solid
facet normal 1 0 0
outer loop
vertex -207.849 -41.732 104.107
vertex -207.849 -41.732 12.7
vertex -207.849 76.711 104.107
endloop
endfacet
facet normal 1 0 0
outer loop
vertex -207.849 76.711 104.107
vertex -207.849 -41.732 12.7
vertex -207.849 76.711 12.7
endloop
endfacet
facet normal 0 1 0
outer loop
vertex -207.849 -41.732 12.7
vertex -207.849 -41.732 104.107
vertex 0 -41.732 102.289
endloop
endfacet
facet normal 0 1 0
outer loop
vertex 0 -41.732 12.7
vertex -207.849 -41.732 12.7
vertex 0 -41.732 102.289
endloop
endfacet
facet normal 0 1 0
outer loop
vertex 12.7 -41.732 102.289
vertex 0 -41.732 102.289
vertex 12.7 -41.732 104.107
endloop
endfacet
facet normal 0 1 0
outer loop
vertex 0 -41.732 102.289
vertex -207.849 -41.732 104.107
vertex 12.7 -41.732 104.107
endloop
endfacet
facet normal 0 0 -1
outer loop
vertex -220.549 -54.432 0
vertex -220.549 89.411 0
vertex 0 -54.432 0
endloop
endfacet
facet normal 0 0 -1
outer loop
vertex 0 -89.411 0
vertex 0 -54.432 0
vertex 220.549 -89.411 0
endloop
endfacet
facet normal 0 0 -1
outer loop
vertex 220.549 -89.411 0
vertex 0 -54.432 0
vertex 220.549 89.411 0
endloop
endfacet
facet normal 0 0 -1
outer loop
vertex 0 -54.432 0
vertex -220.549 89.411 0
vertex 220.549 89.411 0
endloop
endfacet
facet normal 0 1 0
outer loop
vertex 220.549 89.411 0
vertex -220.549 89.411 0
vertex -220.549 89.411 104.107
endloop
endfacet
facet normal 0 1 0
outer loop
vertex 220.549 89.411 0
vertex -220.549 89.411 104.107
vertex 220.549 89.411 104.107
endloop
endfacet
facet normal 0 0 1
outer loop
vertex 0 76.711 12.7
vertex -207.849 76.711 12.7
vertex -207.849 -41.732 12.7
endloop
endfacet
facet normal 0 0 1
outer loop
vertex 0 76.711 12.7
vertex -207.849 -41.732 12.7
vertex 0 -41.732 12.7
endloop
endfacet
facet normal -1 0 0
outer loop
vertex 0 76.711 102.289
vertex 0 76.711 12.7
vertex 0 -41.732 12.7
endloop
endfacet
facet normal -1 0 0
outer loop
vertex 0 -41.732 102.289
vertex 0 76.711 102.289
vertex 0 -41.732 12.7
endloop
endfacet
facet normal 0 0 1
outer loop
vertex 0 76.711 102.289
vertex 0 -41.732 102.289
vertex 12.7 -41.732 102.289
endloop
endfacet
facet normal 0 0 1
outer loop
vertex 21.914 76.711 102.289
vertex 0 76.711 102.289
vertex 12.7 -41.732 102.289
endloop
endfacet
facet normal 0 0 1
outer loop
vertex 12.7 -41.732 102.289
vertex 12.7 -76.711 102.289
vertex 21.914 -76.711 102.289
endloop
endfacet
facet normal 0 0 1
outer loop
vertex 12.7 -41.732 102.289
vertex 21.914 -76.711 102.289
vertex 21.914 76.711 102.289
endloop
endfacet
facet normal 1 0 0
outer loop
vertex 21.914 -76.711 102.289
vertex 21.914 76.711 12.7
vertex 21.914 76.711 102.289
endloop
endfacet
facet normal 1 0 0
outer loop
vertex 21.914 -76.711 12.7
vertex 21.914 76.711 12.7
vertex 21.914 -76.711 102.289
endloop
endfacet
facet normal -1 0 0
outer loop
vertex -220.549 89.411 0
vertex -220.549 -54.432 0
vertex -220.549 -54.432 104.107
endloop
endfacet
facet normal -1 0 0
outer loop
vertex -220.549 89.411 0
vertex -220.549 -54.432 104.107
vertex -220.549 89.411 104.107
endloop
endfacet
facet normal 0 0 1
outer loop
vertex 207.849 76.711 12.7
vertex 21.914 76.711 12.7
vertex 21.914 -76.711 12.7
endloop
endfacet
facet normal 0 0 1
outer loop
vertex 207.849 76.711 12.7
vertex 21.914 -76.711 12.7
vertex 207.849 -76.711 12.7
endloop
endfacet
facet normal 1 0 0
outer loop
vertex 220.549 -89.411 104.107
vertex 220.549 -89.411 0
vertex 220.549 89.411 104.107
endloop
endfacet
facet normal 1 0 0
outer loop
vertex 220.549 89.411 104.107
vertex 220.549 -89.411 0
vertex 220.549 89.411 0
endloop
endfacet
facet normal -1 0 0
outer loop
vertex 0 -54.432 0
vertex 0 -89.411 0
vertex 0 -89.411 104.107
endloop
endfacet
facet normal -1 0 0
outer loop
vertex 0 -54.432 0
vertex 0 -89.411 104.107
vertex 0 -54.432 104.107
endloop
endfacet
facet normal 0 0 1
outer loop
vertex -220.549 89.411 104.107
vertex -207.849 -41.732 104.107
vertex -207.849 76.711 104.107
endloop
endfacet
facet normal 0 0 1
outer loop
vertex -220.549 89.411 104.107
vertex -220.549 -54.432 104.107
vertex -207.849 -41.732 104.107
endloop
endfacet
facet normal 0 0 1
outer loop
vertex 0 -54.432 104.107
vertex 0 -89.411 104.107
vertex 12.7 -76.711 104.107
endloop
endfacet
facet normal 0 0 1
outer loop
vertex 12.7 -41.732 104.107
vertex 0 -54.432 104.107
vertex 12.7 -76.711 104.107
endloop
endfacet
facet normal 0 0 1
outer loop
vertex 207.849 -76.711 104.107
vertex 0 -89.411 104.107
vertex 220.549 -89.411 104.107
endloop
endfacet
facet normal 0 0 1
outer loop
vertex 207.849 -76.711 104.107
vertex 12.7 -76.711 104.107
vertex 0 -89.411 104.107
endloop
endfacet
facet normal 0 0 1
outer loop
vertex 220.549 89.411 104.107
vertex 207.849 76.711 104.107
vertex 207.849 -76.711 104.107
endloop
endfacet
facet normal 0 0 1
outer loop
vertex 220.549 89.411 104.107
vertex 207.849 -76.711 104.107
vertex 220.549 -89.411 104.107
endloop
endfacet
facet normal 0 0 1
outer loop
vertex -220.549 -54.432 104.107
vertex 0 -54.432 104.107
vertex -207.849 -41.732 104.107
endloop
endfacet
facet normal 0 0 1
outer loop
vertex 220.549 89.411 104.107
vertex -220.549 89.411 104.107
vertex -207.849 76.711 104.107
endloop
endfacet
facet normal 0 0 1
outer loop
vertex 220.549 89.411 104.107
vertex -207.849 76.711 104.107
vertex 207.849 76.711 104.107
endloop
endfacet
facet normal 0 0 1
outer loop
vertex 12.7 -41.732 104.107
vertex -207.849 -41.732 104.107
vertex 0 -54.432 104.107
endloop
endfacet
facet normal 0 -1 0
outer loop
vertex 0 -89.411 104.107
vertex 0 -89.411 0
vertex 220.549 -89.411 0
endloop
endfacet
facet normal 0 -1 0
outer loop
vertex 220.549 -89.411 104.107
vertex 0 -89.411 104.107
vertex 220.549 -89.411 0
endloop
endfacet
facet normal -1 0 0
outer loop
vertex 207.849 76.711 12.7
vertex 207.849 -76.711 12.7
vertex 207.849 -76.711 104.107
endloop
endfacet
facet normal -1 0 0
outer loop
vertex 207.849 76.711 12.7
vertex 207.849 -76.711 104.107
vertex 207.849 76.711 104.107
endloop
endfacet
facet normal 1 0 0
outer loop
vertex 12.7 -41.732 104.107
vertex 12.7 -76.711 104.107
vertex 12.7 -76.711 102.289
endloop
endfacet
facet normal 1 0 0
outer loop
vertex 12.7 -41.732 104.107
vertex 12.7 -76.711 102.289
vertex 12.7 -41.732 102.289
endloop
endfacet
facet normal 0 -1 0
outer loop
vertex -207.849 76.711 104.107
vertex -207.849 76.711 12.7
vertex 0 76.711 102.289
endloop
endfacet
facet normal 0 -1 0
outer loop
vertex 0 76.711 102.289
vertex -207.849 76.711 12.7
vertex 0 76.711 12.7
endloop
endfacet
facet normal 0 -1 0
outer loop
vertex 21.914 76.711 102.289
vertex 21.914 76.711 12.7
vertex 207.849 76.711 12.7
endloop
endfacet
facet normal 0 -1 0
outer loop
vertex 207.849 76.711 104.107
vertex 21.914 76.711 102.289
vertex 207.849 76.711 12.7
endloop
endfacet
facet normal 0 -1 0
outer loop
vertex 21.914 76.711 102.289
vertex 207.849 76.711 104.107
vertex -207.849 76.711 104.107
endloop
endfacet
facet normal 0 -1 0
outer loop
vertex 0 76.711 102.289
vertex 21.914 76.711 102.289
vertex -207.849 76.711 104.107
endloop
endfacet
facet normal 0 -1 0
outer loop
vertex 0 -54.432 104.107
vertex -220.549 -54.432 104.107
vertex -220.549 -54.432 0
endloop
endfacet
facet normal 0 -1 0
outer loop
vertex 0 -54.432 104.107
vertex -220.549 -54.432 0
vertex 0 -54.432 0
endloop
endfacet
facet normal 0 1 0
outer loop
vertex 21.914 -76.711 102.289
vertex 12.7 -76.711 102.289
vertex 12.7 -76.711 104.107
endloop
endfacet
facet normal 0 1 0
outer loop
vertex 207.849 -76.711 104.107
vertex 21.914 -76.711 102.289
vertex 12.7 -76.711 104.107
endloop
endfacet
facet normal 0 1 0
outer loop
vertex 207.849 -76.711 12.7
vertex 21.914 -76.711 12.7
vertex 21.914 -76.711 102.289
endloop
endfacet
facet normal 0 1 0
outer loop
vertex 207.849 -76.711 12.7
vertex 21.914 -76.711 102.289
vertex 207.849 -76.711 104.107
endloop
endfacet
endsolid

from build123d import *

# Parameters (mm, degrees)
F0_W     = 441.0978853703
F0_H     = 178.8222193718
F1_DEPTH = 104.1071284562
F2_W     = 220.5489426851
F2_H     = 34.9790751934
F3_DEPTH = 137.1856275946
F4_T     = -12.7
F5_W     = 21.9141840935
F5_H     = 178.8222193718
F6_DEPTH = 102.2892072797


with BuildPart() as f1:
    # F0 (on Top) → F1 (new body)
    with BuildSketch(Plane.XY):
        Rectangle(F0_W, F0_H)
    extrude(amount=F1_DEPTH)

    # F2 (on face) → F3 (cut)
    with BuildSketch(Plane.XY.offset(104.1071284562)):
        with Locations((-110.2744713426, -71.9215720892)):
            Rectangle(F2_W, F2_H)
    extrude(amount=-F3_DEPTH, mode=Mode.SUBTRACT)

    # F4
    f4_openings = [f1.faces().sort_by_distance(p)[0] for p in [
        (11.954487, 7.796778, 104.107128),
    ]]
    offset(amount=F4_T, openings=f4_openings, kind=Kind.INTERSECTION)

    # F5 (on face) → F6 (join)
    with BuildSketch(Plane(origin=(0, 0, 0), x_dir=(1, 0, 0), z_dir=(0, 0, -1))):
        with Locations((10.9570920467, 0)):
            Rectangle(F5_W, F5_H)
    extrude(amount=-F6_DEPTH)


solid = f1.part
